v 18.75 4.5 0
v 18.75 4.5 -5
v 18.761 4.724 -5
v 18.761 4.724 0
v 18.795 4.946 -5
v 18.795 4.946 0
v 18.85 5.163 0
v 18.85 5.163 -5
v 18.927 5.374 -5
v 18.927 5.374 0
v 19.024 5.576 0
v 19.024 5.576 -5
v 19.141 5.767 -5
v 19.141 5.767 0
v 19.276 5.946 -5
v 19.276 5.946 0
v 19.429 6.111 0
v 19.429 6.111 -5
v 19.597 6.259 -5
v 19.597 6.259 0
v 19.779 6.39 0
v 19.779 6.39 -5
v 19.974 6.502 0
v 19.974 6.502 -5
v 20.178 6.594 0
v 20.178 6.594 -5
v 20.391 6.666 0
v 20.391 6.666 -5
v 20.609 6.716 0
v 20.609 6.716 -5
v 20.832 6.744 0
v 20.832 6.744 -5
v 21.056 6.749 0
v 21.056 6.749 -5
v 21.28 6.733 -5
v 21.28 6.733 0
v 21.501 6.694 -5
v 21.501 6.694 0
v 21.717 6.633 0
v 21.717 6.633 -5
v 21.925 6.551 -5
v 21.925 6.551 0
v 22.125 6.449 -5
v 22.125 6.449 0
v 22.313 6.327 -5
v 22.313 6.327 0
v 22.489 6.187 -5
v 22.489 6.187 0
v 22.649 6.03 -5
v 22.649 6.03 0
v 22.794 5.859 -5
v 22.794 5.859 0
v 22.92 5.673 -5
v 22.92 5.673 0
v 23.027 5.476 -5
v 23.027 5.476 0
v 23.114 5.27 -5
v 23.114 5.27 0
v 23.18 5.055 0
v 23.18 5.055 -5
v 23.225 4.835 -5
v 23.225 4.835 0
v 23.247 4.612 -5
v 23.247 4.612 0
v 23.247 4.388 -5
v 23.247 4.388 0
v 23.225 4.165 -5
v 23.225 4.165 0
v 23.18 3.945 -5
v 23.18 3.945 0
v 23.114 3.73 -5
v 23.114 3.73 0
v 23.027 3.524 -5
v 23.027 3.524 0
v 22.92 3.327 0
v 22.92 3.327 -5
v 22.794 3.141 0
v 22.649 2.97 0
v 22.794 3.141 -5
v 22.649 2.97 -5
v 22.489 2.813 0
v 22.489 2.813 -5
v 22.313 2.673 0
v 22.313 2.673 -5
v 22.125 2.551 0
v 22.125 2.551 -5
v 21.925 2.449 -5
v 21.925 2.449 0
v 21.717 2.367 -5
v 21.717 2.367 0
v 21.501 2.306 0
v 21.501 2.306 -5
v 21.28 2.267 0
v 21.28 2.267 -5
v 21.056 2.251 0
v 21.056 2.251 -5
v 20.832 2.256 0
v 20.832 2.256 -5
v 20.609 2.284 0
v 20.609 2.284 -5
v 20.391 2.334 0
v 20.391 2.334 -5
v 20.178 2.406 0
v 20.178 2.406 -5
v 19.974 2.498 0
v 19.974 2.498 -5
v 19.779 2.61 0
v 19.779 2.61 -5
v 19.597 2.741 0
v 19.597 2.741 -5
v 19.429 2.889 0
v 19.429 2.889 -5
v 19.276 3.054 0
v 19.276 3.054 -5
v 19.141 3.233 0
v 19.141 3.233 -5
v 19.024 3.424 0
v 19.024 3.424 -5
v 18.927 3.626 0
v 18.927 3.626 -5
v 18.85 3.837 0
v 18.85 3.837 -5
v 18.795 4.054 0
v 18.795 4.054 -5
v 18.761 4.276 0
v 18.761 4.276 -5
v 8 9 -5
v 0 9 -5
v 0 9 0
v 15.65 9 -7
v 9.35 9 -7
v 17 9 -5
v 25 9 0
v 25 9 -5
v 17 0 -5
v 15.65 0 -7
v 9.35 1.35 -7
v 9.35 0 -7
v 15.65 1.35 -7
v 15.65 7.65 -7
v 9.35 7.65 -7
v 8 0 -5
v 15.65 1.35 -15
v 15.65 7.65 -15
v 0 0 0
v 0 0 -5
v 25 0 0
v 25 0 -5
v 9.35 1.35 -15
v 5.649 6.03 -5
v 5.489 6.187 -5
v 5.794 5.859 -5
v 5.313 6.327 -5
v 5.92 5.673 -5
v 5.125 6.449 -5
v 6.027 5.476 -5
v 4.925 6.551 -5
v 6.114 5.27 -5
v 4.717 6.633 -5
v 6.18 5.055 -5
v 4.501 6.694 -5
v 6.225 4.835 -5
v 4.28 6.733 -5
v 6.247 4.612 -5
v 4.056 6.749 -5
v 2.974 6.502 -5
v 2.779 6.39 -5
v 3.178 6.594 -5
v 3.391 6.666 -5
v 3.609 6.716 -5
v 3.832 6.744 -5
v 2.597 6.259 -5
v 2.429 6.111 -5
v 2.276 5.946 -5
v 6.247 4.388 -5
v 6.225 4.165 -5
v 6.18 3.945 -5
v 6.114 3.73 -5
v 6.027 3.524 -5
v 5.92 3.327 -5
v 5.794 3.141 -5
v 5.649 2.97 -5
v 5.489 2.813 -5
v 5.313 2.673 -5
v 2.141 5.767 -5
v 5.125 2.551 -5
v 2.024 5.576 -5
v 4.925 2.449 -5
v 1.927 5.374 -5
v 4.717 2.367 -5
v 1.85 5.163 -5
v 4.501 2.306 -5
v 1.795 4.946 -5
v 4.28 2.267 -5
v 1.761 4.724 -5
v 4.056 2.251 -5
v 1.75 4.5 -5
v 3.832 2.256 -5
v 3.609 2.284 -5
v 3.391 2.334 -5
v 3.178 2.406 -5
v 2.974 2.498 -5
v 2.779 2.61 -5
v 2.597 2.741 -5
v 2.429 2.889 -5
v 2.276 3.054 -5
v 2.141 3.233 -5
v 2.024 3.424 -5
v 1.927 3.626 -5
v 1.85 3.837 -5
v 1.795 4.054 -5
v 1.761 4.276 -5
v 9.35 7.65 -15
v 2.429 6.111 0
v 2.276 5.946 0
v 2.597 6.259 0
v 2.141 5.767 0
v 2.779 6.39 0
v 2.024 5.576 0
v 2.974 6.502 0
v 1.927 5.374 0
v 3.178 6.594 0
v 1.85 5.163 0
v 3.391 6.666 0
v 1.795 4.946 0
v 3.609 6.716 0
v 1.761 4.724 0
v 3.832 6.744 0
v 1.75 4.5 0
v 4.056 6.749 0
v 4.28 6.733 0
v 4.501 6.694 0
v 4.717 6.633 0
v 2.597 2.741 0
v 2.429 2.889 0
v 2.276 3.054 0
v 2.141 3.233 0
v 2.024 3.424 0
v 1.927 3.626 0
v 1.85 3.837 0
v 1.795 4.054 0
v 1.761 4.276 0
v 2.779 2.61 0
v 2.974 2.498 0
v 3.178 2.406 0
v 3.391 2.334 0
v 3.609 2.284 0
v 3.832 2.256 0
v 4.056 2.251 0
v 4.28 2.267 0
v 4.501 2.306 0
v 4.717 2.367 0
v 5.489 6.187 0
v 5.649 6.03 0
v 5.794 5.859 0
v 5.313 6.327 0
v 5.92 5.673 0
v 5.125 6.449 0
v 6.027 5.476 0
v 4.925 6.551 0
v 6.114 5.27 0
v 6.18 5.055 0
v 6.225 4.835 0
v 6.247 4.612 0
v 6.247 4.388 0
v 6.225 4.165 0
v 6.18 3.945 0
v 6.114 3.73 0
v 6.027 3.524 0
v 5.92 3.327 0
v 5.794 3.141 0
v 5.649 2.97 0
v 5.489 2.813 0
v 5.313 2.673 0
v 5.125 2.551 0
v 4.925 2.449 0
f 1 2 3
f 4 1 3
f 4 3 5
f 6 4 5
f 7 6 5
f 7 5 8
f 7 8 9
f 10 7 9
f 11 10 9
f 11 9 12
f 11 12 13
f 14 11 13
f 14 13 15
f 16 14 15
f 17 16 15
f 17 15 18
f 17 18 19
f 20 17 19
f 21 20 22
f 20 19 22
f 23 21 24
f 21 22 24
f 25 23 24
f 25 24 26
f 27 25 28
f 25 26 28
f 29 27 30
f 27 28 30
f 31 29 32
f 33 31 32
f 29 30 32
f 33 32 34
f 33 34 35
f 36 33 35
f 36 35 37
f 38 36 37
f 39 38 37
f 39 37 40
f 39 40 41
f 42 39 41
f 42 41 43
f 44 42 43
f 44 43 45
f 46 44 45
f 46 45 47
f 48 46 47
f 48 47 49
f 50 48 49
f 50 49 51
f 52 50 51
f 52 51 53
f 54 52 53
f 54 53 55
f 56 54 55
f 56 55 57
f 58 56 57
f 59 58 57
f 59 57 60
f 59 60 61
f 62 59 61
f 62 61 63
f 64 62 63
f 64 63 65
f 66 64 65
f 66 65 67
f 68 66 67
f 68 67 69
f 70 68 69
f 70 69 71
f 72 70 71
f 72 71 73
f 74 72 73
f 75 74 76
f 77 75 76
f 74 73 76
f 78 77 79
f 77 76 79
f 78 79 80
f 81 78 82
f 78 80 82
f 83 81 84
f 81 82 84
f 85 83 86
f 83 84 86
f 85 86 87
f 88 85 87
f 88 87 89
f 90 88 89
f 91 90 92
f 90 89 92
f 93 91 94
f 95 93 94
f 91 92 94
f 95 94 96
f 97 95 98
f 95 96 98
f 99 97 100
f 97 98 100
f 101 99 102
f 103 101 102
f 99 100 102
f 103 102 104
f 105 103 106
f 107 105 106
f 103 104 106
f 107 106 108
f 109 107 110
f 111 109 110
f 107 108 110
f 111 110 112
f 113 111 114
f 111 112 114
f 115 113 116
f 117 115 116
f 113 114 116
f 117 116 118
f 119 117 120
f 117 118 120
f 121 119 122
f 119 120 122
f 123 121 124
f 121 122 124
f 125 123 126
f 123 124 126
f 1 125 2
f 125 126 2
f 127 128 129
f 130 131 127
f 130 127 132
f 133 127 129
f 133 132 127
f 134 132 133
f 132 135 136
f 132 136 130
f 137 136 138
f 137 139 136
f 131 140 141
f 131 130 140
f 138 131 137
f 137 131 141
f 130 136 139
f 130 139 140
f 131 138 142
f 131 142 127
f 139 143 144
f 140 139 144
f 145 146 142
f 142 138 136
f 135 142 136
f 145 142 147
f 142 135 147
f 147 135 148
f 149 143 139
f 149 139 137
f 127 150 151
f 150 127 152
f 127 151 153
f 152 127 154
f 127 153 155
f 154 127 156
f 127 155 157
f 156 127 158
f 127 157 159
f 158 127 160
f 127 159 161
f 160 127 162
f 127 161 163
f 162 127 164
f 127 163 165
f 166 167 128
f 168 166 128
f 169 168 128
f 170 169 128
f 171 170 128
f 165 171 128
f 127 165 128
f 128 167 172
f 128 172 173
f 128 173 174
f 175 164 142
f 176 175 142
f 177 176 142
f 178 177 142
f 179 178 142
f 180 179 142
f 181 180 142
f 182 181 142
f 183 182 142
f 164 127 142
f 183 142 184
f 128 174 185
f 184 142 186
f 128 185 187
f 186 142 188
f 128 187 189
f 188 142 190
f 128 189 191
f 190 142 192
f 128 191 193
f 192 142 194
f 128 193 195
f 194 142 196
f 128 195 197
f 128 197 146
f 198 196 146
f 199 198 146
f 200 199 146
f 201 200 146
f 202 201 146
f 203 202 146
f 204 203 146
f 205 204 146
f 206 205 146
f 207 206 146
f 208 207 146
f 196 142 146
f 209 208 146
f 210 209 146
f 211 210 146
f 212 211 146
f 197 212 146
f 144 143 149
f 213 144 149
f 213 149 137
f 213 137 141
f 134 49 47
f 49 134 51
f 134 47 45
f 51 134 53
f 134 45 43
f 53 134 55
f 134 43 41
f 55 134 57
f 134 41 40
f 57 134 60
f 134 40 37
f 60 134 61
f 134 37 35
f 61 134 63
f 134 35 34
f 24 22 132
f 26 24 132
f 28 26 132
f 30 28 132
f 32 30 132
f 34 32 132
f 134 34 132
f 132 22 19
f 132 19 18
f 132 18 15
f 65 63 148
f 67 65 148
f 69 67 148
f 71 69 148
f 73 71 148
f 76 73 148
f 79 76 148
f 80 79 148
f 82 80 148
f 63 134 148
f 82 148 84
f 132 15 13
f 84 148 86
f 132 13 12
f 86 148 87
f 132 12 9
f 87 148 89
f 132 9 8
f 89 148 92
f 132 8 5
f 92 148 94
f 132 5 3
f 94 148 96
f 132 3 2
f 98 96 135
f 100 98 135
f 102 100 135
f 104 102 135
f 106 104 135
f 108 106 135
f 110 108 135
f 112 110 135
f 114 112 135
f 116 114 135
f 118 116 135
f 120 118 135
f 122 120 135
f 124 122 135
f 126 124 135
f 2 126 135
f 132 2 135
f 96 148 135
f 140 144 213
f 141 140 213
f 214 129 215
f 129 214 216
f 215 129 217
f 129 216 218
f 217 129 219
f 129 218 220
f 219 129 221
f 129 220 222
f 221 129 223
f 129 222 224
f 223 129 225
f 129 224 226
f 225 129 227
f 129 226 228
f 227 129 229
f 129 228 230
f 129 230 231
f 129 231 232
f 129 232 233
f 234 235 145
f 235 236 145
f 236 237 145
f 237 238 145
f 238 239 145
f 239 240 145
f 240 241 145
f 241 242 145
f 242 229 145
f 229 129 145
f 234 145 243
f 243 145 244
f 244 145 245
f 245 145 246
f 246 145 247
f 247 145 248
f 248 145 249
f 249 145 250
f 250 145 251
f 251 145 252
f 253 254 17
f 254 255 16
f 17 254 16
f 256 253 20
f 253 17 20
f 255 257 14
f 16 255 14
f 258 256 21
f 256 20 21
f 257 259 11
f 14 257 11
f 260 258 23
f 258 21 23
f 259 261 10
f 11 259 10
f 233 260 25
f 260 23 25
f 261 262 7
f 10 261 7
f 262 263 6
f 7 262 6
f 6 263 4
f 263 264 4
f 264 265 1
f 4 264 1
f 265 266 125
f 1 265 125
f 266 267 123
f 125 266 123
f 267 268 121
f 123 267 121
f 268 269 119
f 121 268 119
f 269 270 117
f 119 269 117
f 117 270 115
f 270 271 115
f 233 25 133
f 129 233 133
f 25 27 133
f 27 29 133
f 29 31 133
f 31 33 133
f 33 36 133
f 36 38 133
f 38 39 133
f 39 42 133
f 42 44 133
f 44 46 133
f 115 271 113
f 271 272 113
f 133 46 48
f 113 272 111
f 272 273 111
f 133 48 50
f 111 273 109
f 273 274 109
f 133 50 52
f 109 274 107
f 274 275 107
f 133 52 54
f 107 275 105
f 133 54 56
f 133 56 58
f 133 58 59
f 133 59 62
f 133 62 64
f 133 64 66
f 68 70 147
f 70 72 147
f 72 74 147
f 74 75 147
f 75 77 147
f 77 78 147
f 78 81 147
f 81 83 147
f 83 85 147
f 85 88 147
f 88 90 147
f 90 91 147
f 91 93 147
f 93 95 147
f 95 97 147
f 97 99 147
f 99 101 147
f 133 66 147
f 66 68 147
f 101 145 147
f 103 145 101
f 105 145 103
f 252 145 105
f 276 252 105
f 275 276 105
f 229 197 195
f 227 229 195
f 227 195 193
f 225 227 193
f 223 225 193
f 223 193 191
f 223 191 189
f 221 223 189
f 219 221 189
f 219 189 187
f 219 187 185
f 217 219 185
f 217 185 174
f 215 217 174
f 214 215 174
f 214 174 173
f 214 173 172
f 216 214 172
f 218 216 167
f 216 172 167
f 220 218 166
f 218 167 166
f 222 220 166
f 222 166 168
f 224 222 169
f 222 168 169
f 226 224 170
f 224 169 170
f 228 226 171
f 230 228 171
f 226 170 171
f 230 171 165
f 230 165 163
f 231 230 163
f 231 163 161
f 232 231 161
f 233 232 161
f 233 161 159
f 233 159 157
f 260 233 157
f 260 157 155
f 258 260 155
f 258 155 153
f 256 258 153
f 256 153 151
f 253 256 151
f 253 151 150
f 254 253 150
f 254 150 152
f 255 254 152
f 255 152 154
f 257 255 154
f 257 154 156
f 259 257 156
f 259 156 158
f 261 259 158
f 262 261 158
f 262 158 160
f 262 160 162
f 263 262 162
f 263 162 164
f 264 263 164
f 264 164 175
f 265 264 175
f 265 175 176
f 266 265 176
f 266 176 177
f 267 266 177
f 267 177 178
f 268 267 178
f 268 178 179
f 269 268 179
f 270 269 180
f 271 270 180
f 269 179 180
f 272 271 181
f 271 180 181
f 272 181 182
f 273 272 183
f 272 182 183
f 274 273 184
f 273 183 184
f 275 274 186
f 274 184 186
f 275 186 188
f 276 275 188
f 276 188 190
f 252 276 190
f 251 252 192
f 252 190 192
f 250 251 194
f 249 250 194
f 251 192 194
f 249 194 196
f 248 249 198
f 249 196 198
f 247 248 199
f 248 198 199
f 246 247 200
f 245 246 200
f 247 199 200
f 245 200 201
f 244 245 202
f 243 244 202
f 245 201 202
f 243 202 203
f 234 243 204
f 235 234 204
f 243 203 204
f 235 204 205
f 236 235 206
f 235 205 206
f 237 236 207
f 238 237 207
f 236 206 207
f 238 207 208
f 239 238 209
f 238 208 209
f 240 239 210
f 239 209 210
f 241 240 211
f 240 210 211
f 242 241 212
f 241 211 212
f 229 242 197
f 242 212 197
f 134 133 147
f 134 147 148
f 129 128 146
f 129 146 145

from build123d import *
from OCP.BRepFilletAPI import BRepFilletAPI_MakeChamfer

# Parameters (mm, degrees)
RESSALTO_EXTRUS_O1_DEPTH = 9
ESBO_O2_W                = 9
ESBO_O2_H                = 9
ESBO_O2_W_2              = 6.3
ESBO_O2_H_2              = 6.3
CORTE_EXTRUS_O1_DEPTH    = 8
ESBO_O3_R                = 2.25
CORTE_EXTRUS_O2_DEPTH    = 29.390139133
CHANFRO2_SIZE            = 2
CHANFRO2_SIZE_2          = 1.35


with BuildPart() as part:
    # Esboço1 → Ressalto-extrusão1 (new body)
    with BuildSketch(Plane(origin=(0, 0, 0), x_dir=(1, 0, 0), z_dir=(0, 1, 0))):
        Polygon((0, 0), (25, 0), (25, 5), (17, 5), (17, 15), (8, 15), (8, 5), (0, 5), align=None)
    extrude(amount=RESSALTO_EXTRUS_O1_DEPTH)

    # Esboço2 → Corte-extrusão1 (cut)
    with BuildSketch(Plane(origin=(0, 0, -15), x_dir=(-1, 0, 0), z_dir=(0, 0, -1))):
        with Locations((-12.5, 4.5)):
            Rectangle(ESBO_O2_W, ESBO_O2_H)
        with Locations((-12.5, 4.5)):
            Rectangle(ESBO_O2_W_2, ESBO_O2_H_2, mode=Mode.SUBTRACT)
    extrude(amount=-CORTE_EXTRUS_O1_DEPTH, mode=Mode.SUBTRACT)

    # Esboço3 → Corte-extrusão2 (cut, through all)
    with BuildSketch(Plane(origin=(0, 0, -5), x_dir=(-1, 0, 0), z_dir=(0, 0, -1))):
        with Locations((-4, 4.5)):
            Circle(ESBO_O3_R)
        with Locations((-21, 4.5)):
            Circle(ESBO_O3_R)
    extrude(amount=-CORTE_EXTRUS_O2_DEPTH, mode=Mode.SUBTRACT)

    # Chanfro2
    chanfro2_edges_1 = [part.edges().sort_by_distance(p)[0] for p in [
        (8, 4.5, -7),
    ]]
    chanfro2_side_1 = [part.faces().sort_by_distance(p)[0] for p in [
        (8, 4.5, -6.973),
    ]]
    chanfro2_edges_2 = [part.edges().sort_by_distance(p)[0] for p in [
        (17, 4.5, -7),
    ]]
    chanfro2_side_2 = [part.faces().sort_by_distance(p)[0] for p in [
        (16.973, 4.5, -7),
    ]]
    chanfro2 = BRepFilletAPI_MakeChamfer(part.part.solid().wrapped)
    for e in chanfro2_edges_1:
        chanfro2.Add(CHANFRO2_SIZE - 0.0001, CHANFRO2_SIZE_2 - 0.0001, e.wrapped, chanfro2_side_1[0].wrapped)
    for e in chanfro2_edges_2:
        chanfro2.Add(CHANFRO2_SIZE_2 - 0.0001, CHANFRO2_SIZE - 0.0001, e.wrapped, chanfro2_side_2[0].wrapped)
    add(Compound.cast(chanfro2.Shape()), mode=Mode.REPLACE)  # a hair under: the kernel refuses the full size


solid = part.part
